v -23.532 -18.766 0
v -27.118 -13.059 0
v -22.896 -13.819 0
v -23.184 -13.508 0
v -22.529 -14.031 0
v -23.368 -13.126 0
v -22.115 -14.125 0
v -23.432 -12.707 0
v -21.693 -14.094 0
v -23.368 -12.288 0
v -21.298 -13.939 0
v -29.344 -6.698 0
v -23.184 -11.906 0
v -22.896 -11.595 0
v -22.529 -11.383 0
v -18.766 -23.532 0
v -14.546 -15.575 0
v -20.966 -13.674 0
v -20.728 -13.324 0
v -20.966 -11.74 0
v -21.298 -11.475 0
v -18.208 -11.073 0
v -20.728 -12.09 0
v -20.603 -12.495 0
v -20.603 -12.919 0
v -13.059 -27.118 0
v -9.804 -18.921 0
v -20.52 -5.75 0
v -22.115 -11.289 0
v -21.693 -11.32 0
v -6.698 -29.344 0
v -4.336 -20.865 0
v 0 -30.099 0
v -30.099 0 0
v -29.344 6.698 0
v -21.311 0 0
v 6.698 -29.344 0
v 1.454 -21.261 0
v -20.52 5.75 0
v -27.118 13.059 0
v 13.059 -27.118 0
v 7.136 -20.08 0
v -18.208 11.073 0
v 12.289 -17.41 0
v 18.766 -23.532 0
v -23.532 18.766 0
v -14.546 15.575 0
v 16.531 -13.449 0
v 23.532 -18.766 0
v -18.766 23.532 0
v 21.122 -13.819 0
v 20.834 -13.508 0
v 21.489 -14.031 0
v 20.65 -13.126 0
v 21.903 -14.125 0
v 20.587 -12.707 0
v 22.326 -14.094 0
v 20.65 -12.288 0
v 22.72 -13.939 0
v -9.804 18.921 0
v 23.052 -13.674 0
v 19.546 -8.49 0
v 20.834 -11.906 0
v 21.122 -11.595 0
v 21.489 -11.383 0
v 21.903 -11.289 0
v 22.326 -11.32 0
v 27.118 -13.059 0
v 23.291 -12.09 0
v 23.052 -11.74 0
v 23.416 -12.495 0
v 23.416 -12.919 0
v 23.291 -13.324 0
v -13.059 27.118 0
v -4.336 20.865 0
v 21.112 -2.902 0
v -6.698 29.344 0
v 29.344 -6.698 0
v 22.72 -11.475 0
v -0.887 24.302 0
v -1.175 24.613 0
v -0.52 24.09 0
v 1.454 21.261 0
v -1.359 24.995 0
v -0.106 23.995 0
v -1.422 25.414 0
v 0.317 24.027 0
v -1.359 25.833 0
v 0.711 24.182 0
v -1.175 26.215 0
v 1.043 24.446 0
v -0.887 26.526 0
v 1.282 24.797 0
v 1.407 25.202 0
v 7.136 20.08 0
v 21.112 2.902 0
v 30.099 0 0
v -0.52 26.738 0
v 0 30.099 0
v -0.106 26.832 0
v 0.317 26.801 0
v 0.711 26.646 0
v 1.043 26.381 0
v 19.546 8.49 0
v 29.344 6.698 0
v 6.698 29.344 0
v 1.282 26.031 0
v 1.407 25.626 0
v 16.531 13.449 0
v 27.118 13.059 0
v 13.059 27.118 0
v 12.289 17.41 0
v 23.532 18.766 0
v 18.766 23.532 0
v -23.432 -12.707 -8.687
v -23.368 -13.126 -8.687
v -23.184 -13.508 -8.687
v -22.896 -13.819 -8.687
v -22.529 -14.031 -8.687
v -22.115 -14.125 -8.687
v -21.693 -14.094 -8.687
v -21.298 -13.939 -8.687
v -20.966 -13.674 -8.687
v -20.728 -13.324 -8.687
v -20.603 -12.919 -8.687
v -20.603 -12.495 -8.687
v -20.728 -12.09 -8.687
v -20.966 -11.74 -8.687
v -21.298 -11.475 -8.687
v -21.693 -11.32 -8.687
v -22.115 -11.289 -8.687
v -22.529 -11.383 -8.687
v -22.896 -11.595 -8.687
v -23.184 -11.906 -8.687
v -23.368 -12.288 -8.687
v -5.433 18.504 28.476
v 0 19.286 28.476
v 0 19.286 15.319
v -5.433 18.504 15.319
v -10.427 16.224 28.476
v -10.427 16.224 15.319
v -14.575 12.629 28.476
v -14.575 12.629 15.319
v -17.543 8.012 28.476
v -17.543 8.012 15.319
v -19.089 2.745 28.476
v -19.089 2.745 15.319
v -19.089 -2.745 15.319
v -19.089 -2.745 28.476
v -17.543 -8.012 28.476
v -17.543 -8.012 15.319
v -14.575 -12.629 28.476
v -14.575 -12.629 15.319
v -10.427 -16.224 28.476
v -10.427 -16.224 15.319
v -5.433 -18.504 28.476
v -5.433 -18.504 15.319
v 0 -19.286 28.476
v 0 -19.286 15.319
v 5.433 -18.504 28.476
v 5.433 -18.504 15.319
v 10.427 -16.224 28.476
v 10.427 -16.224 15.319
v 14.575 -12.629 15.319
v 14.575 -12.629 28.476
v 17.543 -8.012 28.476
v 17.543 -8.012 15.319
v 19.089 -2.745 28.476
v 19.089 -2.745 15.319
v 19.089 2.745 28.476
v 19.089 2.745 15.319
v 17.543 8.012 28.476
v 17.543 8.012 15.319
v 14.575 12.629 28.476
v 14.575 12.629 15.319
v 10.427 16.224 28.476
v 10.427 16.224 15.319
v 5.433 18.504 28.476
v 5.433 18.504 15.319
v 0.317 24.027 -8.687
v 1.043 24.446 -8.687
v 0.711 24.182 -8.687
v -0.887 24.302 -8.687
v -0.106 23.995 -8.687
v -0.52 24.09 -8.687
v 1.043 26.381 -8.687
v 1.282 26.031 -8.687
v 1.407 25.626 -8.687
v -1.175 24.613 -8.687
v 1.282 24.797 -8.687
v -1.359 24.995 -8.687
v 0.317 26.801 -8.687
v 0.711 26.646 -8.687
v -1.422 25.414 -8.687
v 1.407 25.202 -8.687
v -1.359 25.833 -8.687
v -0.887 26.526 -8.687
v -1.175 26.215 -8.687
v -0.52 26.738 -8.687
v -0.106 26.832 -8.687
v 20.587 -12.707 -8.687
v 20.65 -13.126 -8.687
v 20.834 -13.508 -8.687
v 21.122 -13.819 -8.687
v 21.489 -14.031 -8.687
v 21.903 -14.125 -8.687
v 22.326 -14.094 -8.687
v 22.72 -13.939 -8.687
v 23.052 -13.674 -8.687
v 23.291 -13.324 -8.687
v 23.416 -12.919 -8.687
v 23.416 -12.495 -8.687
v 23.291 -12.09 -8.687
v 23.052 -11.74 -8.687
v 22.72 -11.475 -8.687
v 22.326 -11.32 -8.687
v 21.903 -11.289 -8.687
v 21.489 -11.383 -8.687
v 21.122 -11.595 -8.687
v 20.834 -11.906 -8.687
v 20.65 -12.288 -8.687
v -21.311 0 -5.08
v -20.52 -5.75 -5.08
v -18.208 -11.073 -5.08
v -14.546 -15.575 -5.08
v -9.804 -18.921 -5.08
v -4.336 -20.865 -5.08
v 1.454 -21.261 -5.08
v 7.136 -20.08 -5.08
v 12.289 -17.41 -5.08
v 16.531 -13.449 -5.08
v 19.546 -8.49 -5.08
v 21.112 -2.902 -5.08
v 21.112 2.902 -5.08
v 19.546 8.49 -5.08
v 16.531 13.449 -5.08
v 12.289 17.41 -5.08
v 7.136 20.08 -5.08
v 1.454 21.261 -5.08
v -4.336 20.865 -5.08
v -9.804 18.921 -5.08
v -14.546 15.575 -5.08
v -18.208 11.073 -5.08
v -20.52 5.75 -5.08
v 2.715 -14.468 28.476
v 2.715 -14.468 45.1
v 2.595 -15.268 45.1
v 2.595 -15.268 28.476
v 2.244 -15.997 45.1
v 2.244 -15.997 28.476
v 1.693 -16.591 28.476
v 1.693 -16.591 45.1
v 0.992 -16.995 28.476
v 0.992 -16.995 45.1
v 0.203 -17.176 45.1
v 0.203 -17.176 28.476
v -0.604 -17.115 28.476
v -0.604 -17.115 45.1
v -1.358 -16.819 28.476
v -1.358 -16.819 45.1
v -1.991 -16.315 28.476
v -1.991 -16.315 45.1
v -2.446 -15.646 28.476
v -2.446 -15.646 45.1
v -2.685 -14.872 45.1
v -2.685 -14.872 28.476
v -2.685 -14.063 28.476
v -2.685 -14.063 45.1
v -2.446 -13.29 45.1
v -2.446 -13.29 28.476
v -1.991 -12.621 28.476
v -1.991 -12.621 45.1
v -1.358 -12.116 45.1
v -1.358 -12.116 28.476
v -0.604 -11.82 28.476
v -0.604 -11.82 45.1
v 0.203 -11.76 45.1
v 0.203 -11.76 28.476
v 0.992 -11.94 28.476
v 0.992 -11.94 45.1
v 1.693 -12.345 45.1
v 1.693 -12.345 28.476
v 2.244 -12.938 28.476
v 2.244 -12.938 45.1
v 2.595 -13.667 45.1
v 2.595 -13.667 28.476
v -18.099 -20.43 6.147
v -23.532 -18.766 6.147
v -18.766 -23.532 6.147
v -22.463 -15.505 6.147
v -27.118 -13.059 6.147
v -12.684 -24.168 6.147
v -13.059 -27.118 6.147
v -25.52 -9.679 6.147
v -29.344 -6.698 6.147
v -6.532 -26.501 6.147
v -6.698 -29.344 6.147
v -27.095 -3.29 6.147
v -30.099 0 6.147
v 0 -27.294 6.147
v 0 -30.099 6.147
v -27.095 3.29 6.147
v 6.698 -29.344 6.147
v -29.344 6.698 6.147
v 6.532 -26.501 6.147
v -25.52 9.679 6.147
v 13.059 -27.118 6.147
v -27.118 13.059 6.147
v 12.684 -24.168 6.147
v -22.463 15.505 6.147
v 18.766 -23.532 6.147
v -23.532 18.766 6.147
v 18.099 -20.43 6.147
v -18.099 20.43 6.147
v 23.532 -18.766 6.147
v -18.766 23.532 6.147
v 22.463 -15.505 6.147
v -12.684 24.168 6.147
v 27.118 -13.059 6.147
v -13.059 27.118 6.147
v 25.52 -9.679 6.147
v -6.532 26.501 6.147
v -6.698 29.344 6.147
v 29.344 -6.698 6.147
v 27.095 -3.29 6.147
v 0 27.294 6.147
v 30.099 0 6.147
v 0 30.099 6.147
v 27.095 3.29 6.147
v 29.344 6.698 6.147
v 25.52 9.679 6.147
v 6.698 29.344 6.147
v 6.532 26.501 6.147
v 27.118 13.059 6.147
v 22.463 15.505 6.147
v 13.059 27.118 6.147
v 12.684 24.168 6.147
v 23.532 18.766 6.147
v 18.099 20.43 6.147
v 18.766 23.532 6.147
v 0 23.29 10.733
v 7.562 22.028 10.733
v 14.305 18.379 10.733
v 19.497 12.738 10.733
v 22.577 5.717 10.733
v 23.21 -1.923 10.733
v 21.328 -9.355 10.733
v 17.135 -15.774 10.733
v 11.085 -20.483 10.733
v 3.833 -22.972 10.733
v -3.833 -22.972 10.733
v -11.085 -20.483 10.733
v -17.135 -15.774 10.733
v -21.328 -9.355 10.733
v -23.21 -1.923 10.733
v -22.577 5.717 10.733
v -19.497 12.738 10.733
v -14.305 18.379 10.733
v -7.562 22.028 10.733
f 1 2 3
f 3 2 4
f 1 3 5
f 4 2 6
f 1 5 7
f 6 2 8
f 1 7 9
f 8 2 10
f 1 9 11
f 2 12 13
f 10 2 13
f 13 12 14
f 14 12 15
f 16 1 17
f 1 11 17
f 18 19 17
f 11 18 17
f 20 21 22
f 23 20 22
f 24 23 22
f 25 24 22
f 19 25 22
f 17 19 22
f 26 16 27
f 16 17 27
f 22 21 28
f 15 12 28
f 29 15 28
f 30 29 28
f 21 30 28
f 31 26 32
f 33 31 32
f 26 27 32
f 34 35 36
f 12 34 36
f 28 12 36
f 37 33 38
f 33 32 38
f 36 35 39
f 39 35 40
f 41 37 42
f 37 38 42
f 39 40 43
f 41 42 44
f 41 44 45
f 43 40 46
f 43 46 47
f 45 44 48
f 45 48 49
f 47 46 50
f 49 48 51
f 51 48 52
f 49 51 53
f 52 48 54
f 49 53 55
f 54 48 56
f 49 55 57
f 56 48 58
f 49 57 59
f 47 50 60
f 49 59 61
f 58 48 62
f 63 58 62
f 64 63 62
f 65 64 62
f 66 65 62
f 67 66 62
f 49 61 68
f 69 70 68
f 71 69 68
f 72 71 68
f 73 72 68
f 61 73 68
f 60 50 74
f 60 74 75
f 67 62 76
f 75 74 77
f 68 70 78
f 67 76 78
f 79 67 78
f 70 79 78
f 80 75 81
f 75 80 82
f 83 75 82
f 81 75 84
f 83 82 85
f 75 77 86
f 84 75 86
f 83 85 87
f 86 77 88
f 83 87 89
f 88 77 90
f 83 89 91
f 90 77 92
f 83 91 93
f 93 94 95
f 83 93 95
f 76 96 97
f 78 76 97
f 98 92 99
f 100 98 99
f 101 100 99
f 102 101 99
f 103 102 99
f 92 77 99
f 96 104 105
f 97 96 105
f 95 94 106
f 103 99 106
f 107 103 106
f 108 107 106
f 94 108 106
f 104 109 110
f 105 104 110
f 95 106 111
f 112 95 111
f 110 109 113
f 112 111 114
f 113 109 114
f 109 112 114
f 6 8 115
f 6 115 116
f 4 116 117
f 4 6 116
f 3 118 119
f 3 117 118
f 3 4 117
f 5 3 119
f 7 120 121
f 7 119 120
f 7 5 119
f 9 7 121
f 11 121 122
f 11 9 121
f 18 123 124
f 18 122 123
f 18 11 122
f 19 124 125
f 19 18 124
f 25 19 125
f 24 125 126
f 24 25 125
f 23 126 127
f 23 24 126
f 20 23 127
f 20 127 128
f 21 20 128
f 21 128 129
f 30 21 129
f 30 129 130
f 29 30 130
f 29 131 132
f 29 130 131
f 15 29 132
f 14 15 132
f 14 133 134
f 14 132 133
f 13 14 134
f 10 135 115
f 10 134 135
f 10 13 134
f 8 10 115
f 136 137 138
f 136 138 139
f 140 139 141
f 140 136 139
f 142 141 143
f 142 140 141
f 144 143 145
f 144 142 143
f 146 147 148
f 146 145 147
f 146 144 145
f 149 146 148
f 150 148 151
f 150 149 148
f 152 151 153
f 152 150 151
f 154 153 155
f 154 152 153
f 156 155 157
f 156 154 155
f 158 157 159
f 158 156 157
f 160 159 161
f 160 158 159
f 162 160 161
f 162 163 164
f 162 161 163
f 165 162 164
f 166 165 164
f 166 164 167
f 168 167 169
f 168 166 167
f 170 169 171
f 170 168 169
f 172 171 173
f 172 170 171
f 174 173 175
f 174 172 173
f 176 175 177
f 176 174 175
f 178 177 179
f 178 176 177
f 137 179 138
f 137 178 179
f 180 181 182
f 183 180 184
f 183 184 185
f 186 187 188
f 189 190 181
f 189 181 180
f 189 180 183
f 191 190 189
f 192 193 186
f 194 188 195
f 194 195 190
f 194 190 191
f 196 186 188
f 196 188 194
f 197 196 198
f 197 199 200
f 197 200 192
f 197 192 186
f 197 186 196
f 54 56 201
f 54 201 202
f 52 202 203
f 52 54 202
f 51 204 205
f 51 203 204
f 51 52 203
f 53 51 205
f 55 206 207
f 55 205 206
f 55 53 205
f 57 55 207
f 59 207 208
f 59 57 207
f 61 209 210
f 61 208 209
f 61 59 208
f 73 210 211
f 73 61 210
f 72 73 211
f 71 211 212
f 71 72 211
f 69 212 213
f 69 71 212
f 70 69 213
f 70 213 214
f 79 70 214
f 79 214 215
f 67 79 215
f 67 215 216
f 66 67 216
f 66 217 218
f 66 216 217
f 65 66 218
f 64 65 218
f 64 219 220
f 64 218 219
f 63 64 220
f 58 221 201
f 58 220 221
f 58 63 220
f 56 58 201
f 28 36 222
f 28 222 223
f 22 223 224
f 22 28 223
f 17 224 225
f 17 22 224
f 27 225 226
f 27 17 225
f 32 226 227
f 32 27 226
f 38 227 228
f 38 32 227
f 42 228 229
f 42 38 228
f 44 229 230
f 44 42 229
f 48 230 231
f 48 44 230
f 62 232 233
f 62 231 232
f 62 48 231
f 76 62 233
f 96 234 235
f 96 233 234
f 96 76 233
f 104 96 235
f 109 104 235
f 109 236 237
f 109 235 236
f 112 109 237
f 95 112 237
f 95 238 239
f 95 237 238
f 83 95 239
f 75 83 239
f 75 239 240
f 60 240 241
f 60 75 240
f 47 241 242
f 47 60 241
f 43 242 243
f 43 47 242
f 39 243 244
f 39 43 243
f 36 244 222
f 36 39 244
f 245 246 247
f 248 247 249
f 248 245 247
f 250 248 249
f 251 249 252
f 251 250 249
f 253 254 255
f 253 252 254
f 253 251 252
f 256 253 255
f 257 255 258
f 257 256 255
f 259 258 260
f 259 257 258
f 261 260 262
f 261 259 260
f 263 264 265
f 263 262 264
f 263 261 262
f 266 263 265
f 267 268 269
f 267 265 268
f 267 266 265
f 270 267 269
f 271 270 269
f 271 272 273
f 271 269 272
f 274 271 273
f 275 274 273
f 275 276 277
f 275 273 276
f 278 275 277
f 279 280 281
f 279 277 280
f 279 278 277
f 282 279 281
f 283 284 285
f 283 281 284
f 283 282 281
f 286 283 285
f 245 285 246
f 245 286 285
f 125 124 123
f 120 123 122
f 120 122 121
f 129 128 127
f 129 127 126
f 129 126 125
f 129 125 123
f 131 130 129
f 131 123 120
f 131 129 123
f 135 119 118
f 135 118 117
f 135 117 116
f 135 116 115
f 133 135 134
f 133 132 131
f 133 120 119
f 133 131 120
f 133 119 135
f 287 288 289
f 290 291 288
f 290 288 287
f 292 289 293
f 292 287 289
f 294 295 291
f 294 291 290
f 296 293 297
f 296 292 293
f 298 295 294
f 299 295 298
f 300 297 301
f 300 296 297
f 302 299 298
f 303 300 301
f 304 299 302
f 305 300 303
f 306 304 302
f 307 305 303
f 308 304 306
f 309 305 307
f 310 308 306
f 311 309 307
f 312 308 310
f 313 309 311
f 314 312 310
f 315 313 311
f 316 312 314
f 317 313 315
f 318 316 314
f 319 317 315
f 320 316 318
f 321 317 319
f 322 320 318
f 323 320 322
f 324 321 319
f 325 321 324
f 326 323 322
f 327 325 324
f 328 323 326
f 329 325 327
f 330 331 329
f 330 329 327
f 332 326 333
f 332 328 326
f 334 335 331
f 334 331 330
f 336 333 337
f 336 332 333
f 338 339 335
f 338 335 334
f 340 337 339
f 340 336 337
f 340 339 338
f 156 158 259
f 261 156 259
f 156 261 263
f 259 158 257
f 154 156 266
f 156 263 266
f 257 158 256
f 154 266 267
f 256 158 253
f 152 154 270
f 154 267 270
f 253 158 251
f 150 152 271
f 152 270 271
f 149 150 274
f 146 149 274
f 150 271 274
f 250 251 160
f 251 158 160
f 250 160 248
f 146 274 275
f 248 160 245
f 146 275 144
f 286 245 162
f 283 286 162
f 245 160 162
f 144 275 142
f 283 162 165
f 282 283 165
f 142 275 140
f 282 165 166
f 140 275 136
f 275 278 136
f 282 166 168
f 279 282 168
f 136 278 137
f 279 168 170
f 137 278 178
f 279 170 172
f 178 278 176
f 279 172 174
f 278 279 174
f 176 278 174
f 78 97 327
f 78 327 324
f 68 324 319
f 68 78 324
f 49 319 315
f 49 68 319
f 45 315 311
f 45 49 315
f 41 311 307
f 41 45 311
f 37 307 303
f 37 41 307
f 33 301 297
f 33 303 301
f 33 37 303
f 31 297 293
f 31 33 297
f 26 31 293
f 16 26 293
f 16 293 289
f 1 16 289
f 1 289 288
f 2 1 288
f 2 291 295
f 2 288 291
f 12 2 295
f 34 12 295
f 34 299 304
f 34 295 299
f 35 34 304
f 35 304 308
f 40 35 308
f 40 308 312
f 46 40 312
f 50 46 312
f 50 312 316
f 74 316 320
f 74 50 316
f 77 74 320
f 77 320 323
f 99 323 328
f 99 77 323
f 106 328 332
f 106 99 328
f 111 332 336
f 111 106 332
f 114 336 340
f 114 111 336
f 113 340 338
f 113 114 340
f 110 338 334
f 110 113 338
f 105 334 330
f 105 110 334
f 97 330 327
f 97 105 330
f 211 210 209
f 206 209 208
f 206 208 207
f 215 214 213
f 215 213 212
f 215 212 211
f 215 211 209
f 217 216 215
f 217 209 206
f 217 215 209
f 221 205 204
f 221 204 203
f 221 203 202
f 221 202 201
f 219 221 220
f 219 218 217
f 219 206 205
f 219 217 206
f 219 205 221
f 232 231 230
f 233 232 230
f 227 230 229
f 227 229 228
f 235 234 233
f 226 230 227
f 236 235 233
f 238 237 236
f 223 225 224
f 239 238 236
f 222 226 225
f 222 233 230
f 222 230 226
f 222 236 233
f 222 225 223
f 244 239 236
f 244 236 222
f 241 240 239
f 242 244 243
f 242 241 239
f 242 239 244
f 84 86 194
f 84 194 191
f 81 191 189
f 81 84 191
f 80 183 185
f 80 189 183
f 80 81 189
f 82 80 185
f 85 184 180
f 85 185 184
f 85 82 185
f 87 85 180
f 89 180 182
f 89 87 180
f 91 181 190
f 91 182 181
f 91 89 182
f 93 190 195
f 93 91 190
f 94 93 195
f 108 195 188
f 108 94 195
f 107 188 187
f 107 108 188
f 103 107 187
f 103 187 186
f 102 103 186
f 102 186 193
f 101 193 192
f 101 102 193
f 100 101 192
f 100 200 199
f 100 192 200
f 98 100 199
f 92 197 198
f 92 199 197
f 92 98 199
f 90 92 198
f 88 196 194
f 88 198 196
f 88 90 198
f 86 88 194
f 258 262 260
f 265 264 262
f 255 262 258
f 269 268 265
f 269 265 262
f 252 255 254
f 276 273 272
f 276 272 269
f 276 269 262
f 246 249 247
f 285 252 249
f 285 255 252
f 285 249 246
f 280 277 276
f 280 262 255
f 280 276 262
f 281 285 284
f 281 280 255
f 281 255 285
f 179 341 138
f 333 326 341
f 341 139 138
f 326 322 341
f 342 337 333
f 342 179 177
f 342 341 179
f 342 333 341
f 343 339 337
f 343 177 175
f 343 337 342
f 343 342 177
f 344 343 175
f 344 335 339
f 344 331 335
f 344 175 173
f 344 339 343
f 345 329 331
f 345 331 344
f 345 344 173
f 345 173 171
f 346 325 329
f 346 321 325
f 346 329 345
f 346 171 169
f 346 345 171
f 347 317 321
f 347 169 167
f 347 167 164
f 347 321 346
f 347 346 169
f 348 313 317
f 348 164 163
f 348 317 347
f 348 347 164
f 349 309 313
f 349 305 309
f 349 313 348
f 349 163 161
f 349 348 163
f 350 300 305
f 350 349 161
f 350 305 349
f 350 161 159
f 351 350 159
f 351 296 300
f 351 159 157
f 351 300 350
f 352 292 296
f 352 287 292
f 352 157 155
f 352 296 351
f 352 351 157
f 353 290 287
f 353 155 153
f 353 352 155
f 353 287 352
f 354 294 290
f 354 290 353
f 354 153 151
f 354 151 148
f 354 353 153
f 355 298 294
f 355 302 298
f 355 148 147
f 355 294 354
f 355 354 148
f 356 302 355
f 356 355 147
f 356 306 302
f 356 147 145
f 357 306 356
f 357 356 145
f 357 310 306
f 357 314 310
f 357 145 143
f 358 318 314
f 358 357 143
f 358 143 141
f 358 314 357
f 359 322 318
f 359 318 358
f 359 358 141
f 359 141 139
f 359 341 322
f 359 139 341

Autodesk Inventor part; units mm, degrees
ref_plane "YZ Plane" through (0, 0, 0) normal (1, 0, 0) x (0, 1, 0)
ref_plane "XZ Plane" through (0, 0, 0) normal (0, 1, 0) x (-1, 0, 0)
ref_plane "XY Plane" through (0, 0, 0) normal (0, 0, 1) x (1, 0, 0)
sketch "Sketch1" plane through (0, 0, 0) normal (0, 0, 1) x (1, 0, 0)
  circle A0 centre (0, 0) radius 30.099
  dimension "d0" = 60.198
extrude "Extrusion1" add sketch "Sketch1" along normal blind 6.1468
sketch "Sketch2" plane through (0, 0, 0) normal (0, 0, -1) x (-1, 0, 0)
  circle A0 centre (0, 0) radius 21.3106
  dimension "d3" = 42.6212
extrude "Extrusion2" add sketch "Sketch2" along normal blind 5.08
sketch "Sketch3" plane through (0, 0, 0) normal (0, 0, -1) x (-1, 0, 0)
  circle A0 centre (0, 0) radius 21.3106 projected
  circle A1 centre (0, 0) radius 30.099 projected
  line L0 (0, 25.4139) -> (22.0091, -12.707) construction
  line L1 (22.0091, -12.707) -> (-22.0091, -12.707) construction
  line L2 (-22.0091, -12.707) -> (0, 25.4139) construction
  circle A2 centre (0, 25.4139) radius 1.4224
  circle A3 centre (22.0091, -12.707) radius 1.4224
  circle A4 centre (-22.0091, -12.707) radius 1.4224
  line L3 (-11.071, 20.6645) -> (5.4814, 30.221) construction
  line L4 (36.2551, -6.1245) -> (10.9127, -20.7559) construction
  dimension "d6" = 44.0182
  dimension "d7" = 2.8448
  dimension "d8" = 46.863
extrude "Extrusion3" add sketch "Sketch3" along normal blind 8.6868 contours A2 | A3 | A4
sketch "Sketch4" plane through (0, 0, 0) normal (1, 0, 0) x (0, 1, 0)
  line L0 (30.099, 6.1468) -> (-30.099, 6.1468) projected
  line L1 (27.2941, 6.1468) -> (19.2856, 15.3189)
  line L2 (19.2856, 15.3189) -> (19.2856, 28.4756)
  line L3 (19.2856, 28.4756) -> (0, 28.4756)
  line L4 (0, 28.4756) -> (0, 0)
  point P0 (0, 6.1468)
revolve "Revolution1" add sketch "Sketch4" angle 360 about axis through (0, 0, 28.4756) along (0, 0, -1)
sketch "Sketch5" plane through (0, 0, 28.4756) normal (0, 0, 1) x (1, 0, 0)
  circle A0 centre (0, -14.4677) radius 2.7154
  point P0 (0, 0)
extrude "Extrusion4" add sketch "Sketch5" along normal blind 16.6243
properties part number "MPG"
